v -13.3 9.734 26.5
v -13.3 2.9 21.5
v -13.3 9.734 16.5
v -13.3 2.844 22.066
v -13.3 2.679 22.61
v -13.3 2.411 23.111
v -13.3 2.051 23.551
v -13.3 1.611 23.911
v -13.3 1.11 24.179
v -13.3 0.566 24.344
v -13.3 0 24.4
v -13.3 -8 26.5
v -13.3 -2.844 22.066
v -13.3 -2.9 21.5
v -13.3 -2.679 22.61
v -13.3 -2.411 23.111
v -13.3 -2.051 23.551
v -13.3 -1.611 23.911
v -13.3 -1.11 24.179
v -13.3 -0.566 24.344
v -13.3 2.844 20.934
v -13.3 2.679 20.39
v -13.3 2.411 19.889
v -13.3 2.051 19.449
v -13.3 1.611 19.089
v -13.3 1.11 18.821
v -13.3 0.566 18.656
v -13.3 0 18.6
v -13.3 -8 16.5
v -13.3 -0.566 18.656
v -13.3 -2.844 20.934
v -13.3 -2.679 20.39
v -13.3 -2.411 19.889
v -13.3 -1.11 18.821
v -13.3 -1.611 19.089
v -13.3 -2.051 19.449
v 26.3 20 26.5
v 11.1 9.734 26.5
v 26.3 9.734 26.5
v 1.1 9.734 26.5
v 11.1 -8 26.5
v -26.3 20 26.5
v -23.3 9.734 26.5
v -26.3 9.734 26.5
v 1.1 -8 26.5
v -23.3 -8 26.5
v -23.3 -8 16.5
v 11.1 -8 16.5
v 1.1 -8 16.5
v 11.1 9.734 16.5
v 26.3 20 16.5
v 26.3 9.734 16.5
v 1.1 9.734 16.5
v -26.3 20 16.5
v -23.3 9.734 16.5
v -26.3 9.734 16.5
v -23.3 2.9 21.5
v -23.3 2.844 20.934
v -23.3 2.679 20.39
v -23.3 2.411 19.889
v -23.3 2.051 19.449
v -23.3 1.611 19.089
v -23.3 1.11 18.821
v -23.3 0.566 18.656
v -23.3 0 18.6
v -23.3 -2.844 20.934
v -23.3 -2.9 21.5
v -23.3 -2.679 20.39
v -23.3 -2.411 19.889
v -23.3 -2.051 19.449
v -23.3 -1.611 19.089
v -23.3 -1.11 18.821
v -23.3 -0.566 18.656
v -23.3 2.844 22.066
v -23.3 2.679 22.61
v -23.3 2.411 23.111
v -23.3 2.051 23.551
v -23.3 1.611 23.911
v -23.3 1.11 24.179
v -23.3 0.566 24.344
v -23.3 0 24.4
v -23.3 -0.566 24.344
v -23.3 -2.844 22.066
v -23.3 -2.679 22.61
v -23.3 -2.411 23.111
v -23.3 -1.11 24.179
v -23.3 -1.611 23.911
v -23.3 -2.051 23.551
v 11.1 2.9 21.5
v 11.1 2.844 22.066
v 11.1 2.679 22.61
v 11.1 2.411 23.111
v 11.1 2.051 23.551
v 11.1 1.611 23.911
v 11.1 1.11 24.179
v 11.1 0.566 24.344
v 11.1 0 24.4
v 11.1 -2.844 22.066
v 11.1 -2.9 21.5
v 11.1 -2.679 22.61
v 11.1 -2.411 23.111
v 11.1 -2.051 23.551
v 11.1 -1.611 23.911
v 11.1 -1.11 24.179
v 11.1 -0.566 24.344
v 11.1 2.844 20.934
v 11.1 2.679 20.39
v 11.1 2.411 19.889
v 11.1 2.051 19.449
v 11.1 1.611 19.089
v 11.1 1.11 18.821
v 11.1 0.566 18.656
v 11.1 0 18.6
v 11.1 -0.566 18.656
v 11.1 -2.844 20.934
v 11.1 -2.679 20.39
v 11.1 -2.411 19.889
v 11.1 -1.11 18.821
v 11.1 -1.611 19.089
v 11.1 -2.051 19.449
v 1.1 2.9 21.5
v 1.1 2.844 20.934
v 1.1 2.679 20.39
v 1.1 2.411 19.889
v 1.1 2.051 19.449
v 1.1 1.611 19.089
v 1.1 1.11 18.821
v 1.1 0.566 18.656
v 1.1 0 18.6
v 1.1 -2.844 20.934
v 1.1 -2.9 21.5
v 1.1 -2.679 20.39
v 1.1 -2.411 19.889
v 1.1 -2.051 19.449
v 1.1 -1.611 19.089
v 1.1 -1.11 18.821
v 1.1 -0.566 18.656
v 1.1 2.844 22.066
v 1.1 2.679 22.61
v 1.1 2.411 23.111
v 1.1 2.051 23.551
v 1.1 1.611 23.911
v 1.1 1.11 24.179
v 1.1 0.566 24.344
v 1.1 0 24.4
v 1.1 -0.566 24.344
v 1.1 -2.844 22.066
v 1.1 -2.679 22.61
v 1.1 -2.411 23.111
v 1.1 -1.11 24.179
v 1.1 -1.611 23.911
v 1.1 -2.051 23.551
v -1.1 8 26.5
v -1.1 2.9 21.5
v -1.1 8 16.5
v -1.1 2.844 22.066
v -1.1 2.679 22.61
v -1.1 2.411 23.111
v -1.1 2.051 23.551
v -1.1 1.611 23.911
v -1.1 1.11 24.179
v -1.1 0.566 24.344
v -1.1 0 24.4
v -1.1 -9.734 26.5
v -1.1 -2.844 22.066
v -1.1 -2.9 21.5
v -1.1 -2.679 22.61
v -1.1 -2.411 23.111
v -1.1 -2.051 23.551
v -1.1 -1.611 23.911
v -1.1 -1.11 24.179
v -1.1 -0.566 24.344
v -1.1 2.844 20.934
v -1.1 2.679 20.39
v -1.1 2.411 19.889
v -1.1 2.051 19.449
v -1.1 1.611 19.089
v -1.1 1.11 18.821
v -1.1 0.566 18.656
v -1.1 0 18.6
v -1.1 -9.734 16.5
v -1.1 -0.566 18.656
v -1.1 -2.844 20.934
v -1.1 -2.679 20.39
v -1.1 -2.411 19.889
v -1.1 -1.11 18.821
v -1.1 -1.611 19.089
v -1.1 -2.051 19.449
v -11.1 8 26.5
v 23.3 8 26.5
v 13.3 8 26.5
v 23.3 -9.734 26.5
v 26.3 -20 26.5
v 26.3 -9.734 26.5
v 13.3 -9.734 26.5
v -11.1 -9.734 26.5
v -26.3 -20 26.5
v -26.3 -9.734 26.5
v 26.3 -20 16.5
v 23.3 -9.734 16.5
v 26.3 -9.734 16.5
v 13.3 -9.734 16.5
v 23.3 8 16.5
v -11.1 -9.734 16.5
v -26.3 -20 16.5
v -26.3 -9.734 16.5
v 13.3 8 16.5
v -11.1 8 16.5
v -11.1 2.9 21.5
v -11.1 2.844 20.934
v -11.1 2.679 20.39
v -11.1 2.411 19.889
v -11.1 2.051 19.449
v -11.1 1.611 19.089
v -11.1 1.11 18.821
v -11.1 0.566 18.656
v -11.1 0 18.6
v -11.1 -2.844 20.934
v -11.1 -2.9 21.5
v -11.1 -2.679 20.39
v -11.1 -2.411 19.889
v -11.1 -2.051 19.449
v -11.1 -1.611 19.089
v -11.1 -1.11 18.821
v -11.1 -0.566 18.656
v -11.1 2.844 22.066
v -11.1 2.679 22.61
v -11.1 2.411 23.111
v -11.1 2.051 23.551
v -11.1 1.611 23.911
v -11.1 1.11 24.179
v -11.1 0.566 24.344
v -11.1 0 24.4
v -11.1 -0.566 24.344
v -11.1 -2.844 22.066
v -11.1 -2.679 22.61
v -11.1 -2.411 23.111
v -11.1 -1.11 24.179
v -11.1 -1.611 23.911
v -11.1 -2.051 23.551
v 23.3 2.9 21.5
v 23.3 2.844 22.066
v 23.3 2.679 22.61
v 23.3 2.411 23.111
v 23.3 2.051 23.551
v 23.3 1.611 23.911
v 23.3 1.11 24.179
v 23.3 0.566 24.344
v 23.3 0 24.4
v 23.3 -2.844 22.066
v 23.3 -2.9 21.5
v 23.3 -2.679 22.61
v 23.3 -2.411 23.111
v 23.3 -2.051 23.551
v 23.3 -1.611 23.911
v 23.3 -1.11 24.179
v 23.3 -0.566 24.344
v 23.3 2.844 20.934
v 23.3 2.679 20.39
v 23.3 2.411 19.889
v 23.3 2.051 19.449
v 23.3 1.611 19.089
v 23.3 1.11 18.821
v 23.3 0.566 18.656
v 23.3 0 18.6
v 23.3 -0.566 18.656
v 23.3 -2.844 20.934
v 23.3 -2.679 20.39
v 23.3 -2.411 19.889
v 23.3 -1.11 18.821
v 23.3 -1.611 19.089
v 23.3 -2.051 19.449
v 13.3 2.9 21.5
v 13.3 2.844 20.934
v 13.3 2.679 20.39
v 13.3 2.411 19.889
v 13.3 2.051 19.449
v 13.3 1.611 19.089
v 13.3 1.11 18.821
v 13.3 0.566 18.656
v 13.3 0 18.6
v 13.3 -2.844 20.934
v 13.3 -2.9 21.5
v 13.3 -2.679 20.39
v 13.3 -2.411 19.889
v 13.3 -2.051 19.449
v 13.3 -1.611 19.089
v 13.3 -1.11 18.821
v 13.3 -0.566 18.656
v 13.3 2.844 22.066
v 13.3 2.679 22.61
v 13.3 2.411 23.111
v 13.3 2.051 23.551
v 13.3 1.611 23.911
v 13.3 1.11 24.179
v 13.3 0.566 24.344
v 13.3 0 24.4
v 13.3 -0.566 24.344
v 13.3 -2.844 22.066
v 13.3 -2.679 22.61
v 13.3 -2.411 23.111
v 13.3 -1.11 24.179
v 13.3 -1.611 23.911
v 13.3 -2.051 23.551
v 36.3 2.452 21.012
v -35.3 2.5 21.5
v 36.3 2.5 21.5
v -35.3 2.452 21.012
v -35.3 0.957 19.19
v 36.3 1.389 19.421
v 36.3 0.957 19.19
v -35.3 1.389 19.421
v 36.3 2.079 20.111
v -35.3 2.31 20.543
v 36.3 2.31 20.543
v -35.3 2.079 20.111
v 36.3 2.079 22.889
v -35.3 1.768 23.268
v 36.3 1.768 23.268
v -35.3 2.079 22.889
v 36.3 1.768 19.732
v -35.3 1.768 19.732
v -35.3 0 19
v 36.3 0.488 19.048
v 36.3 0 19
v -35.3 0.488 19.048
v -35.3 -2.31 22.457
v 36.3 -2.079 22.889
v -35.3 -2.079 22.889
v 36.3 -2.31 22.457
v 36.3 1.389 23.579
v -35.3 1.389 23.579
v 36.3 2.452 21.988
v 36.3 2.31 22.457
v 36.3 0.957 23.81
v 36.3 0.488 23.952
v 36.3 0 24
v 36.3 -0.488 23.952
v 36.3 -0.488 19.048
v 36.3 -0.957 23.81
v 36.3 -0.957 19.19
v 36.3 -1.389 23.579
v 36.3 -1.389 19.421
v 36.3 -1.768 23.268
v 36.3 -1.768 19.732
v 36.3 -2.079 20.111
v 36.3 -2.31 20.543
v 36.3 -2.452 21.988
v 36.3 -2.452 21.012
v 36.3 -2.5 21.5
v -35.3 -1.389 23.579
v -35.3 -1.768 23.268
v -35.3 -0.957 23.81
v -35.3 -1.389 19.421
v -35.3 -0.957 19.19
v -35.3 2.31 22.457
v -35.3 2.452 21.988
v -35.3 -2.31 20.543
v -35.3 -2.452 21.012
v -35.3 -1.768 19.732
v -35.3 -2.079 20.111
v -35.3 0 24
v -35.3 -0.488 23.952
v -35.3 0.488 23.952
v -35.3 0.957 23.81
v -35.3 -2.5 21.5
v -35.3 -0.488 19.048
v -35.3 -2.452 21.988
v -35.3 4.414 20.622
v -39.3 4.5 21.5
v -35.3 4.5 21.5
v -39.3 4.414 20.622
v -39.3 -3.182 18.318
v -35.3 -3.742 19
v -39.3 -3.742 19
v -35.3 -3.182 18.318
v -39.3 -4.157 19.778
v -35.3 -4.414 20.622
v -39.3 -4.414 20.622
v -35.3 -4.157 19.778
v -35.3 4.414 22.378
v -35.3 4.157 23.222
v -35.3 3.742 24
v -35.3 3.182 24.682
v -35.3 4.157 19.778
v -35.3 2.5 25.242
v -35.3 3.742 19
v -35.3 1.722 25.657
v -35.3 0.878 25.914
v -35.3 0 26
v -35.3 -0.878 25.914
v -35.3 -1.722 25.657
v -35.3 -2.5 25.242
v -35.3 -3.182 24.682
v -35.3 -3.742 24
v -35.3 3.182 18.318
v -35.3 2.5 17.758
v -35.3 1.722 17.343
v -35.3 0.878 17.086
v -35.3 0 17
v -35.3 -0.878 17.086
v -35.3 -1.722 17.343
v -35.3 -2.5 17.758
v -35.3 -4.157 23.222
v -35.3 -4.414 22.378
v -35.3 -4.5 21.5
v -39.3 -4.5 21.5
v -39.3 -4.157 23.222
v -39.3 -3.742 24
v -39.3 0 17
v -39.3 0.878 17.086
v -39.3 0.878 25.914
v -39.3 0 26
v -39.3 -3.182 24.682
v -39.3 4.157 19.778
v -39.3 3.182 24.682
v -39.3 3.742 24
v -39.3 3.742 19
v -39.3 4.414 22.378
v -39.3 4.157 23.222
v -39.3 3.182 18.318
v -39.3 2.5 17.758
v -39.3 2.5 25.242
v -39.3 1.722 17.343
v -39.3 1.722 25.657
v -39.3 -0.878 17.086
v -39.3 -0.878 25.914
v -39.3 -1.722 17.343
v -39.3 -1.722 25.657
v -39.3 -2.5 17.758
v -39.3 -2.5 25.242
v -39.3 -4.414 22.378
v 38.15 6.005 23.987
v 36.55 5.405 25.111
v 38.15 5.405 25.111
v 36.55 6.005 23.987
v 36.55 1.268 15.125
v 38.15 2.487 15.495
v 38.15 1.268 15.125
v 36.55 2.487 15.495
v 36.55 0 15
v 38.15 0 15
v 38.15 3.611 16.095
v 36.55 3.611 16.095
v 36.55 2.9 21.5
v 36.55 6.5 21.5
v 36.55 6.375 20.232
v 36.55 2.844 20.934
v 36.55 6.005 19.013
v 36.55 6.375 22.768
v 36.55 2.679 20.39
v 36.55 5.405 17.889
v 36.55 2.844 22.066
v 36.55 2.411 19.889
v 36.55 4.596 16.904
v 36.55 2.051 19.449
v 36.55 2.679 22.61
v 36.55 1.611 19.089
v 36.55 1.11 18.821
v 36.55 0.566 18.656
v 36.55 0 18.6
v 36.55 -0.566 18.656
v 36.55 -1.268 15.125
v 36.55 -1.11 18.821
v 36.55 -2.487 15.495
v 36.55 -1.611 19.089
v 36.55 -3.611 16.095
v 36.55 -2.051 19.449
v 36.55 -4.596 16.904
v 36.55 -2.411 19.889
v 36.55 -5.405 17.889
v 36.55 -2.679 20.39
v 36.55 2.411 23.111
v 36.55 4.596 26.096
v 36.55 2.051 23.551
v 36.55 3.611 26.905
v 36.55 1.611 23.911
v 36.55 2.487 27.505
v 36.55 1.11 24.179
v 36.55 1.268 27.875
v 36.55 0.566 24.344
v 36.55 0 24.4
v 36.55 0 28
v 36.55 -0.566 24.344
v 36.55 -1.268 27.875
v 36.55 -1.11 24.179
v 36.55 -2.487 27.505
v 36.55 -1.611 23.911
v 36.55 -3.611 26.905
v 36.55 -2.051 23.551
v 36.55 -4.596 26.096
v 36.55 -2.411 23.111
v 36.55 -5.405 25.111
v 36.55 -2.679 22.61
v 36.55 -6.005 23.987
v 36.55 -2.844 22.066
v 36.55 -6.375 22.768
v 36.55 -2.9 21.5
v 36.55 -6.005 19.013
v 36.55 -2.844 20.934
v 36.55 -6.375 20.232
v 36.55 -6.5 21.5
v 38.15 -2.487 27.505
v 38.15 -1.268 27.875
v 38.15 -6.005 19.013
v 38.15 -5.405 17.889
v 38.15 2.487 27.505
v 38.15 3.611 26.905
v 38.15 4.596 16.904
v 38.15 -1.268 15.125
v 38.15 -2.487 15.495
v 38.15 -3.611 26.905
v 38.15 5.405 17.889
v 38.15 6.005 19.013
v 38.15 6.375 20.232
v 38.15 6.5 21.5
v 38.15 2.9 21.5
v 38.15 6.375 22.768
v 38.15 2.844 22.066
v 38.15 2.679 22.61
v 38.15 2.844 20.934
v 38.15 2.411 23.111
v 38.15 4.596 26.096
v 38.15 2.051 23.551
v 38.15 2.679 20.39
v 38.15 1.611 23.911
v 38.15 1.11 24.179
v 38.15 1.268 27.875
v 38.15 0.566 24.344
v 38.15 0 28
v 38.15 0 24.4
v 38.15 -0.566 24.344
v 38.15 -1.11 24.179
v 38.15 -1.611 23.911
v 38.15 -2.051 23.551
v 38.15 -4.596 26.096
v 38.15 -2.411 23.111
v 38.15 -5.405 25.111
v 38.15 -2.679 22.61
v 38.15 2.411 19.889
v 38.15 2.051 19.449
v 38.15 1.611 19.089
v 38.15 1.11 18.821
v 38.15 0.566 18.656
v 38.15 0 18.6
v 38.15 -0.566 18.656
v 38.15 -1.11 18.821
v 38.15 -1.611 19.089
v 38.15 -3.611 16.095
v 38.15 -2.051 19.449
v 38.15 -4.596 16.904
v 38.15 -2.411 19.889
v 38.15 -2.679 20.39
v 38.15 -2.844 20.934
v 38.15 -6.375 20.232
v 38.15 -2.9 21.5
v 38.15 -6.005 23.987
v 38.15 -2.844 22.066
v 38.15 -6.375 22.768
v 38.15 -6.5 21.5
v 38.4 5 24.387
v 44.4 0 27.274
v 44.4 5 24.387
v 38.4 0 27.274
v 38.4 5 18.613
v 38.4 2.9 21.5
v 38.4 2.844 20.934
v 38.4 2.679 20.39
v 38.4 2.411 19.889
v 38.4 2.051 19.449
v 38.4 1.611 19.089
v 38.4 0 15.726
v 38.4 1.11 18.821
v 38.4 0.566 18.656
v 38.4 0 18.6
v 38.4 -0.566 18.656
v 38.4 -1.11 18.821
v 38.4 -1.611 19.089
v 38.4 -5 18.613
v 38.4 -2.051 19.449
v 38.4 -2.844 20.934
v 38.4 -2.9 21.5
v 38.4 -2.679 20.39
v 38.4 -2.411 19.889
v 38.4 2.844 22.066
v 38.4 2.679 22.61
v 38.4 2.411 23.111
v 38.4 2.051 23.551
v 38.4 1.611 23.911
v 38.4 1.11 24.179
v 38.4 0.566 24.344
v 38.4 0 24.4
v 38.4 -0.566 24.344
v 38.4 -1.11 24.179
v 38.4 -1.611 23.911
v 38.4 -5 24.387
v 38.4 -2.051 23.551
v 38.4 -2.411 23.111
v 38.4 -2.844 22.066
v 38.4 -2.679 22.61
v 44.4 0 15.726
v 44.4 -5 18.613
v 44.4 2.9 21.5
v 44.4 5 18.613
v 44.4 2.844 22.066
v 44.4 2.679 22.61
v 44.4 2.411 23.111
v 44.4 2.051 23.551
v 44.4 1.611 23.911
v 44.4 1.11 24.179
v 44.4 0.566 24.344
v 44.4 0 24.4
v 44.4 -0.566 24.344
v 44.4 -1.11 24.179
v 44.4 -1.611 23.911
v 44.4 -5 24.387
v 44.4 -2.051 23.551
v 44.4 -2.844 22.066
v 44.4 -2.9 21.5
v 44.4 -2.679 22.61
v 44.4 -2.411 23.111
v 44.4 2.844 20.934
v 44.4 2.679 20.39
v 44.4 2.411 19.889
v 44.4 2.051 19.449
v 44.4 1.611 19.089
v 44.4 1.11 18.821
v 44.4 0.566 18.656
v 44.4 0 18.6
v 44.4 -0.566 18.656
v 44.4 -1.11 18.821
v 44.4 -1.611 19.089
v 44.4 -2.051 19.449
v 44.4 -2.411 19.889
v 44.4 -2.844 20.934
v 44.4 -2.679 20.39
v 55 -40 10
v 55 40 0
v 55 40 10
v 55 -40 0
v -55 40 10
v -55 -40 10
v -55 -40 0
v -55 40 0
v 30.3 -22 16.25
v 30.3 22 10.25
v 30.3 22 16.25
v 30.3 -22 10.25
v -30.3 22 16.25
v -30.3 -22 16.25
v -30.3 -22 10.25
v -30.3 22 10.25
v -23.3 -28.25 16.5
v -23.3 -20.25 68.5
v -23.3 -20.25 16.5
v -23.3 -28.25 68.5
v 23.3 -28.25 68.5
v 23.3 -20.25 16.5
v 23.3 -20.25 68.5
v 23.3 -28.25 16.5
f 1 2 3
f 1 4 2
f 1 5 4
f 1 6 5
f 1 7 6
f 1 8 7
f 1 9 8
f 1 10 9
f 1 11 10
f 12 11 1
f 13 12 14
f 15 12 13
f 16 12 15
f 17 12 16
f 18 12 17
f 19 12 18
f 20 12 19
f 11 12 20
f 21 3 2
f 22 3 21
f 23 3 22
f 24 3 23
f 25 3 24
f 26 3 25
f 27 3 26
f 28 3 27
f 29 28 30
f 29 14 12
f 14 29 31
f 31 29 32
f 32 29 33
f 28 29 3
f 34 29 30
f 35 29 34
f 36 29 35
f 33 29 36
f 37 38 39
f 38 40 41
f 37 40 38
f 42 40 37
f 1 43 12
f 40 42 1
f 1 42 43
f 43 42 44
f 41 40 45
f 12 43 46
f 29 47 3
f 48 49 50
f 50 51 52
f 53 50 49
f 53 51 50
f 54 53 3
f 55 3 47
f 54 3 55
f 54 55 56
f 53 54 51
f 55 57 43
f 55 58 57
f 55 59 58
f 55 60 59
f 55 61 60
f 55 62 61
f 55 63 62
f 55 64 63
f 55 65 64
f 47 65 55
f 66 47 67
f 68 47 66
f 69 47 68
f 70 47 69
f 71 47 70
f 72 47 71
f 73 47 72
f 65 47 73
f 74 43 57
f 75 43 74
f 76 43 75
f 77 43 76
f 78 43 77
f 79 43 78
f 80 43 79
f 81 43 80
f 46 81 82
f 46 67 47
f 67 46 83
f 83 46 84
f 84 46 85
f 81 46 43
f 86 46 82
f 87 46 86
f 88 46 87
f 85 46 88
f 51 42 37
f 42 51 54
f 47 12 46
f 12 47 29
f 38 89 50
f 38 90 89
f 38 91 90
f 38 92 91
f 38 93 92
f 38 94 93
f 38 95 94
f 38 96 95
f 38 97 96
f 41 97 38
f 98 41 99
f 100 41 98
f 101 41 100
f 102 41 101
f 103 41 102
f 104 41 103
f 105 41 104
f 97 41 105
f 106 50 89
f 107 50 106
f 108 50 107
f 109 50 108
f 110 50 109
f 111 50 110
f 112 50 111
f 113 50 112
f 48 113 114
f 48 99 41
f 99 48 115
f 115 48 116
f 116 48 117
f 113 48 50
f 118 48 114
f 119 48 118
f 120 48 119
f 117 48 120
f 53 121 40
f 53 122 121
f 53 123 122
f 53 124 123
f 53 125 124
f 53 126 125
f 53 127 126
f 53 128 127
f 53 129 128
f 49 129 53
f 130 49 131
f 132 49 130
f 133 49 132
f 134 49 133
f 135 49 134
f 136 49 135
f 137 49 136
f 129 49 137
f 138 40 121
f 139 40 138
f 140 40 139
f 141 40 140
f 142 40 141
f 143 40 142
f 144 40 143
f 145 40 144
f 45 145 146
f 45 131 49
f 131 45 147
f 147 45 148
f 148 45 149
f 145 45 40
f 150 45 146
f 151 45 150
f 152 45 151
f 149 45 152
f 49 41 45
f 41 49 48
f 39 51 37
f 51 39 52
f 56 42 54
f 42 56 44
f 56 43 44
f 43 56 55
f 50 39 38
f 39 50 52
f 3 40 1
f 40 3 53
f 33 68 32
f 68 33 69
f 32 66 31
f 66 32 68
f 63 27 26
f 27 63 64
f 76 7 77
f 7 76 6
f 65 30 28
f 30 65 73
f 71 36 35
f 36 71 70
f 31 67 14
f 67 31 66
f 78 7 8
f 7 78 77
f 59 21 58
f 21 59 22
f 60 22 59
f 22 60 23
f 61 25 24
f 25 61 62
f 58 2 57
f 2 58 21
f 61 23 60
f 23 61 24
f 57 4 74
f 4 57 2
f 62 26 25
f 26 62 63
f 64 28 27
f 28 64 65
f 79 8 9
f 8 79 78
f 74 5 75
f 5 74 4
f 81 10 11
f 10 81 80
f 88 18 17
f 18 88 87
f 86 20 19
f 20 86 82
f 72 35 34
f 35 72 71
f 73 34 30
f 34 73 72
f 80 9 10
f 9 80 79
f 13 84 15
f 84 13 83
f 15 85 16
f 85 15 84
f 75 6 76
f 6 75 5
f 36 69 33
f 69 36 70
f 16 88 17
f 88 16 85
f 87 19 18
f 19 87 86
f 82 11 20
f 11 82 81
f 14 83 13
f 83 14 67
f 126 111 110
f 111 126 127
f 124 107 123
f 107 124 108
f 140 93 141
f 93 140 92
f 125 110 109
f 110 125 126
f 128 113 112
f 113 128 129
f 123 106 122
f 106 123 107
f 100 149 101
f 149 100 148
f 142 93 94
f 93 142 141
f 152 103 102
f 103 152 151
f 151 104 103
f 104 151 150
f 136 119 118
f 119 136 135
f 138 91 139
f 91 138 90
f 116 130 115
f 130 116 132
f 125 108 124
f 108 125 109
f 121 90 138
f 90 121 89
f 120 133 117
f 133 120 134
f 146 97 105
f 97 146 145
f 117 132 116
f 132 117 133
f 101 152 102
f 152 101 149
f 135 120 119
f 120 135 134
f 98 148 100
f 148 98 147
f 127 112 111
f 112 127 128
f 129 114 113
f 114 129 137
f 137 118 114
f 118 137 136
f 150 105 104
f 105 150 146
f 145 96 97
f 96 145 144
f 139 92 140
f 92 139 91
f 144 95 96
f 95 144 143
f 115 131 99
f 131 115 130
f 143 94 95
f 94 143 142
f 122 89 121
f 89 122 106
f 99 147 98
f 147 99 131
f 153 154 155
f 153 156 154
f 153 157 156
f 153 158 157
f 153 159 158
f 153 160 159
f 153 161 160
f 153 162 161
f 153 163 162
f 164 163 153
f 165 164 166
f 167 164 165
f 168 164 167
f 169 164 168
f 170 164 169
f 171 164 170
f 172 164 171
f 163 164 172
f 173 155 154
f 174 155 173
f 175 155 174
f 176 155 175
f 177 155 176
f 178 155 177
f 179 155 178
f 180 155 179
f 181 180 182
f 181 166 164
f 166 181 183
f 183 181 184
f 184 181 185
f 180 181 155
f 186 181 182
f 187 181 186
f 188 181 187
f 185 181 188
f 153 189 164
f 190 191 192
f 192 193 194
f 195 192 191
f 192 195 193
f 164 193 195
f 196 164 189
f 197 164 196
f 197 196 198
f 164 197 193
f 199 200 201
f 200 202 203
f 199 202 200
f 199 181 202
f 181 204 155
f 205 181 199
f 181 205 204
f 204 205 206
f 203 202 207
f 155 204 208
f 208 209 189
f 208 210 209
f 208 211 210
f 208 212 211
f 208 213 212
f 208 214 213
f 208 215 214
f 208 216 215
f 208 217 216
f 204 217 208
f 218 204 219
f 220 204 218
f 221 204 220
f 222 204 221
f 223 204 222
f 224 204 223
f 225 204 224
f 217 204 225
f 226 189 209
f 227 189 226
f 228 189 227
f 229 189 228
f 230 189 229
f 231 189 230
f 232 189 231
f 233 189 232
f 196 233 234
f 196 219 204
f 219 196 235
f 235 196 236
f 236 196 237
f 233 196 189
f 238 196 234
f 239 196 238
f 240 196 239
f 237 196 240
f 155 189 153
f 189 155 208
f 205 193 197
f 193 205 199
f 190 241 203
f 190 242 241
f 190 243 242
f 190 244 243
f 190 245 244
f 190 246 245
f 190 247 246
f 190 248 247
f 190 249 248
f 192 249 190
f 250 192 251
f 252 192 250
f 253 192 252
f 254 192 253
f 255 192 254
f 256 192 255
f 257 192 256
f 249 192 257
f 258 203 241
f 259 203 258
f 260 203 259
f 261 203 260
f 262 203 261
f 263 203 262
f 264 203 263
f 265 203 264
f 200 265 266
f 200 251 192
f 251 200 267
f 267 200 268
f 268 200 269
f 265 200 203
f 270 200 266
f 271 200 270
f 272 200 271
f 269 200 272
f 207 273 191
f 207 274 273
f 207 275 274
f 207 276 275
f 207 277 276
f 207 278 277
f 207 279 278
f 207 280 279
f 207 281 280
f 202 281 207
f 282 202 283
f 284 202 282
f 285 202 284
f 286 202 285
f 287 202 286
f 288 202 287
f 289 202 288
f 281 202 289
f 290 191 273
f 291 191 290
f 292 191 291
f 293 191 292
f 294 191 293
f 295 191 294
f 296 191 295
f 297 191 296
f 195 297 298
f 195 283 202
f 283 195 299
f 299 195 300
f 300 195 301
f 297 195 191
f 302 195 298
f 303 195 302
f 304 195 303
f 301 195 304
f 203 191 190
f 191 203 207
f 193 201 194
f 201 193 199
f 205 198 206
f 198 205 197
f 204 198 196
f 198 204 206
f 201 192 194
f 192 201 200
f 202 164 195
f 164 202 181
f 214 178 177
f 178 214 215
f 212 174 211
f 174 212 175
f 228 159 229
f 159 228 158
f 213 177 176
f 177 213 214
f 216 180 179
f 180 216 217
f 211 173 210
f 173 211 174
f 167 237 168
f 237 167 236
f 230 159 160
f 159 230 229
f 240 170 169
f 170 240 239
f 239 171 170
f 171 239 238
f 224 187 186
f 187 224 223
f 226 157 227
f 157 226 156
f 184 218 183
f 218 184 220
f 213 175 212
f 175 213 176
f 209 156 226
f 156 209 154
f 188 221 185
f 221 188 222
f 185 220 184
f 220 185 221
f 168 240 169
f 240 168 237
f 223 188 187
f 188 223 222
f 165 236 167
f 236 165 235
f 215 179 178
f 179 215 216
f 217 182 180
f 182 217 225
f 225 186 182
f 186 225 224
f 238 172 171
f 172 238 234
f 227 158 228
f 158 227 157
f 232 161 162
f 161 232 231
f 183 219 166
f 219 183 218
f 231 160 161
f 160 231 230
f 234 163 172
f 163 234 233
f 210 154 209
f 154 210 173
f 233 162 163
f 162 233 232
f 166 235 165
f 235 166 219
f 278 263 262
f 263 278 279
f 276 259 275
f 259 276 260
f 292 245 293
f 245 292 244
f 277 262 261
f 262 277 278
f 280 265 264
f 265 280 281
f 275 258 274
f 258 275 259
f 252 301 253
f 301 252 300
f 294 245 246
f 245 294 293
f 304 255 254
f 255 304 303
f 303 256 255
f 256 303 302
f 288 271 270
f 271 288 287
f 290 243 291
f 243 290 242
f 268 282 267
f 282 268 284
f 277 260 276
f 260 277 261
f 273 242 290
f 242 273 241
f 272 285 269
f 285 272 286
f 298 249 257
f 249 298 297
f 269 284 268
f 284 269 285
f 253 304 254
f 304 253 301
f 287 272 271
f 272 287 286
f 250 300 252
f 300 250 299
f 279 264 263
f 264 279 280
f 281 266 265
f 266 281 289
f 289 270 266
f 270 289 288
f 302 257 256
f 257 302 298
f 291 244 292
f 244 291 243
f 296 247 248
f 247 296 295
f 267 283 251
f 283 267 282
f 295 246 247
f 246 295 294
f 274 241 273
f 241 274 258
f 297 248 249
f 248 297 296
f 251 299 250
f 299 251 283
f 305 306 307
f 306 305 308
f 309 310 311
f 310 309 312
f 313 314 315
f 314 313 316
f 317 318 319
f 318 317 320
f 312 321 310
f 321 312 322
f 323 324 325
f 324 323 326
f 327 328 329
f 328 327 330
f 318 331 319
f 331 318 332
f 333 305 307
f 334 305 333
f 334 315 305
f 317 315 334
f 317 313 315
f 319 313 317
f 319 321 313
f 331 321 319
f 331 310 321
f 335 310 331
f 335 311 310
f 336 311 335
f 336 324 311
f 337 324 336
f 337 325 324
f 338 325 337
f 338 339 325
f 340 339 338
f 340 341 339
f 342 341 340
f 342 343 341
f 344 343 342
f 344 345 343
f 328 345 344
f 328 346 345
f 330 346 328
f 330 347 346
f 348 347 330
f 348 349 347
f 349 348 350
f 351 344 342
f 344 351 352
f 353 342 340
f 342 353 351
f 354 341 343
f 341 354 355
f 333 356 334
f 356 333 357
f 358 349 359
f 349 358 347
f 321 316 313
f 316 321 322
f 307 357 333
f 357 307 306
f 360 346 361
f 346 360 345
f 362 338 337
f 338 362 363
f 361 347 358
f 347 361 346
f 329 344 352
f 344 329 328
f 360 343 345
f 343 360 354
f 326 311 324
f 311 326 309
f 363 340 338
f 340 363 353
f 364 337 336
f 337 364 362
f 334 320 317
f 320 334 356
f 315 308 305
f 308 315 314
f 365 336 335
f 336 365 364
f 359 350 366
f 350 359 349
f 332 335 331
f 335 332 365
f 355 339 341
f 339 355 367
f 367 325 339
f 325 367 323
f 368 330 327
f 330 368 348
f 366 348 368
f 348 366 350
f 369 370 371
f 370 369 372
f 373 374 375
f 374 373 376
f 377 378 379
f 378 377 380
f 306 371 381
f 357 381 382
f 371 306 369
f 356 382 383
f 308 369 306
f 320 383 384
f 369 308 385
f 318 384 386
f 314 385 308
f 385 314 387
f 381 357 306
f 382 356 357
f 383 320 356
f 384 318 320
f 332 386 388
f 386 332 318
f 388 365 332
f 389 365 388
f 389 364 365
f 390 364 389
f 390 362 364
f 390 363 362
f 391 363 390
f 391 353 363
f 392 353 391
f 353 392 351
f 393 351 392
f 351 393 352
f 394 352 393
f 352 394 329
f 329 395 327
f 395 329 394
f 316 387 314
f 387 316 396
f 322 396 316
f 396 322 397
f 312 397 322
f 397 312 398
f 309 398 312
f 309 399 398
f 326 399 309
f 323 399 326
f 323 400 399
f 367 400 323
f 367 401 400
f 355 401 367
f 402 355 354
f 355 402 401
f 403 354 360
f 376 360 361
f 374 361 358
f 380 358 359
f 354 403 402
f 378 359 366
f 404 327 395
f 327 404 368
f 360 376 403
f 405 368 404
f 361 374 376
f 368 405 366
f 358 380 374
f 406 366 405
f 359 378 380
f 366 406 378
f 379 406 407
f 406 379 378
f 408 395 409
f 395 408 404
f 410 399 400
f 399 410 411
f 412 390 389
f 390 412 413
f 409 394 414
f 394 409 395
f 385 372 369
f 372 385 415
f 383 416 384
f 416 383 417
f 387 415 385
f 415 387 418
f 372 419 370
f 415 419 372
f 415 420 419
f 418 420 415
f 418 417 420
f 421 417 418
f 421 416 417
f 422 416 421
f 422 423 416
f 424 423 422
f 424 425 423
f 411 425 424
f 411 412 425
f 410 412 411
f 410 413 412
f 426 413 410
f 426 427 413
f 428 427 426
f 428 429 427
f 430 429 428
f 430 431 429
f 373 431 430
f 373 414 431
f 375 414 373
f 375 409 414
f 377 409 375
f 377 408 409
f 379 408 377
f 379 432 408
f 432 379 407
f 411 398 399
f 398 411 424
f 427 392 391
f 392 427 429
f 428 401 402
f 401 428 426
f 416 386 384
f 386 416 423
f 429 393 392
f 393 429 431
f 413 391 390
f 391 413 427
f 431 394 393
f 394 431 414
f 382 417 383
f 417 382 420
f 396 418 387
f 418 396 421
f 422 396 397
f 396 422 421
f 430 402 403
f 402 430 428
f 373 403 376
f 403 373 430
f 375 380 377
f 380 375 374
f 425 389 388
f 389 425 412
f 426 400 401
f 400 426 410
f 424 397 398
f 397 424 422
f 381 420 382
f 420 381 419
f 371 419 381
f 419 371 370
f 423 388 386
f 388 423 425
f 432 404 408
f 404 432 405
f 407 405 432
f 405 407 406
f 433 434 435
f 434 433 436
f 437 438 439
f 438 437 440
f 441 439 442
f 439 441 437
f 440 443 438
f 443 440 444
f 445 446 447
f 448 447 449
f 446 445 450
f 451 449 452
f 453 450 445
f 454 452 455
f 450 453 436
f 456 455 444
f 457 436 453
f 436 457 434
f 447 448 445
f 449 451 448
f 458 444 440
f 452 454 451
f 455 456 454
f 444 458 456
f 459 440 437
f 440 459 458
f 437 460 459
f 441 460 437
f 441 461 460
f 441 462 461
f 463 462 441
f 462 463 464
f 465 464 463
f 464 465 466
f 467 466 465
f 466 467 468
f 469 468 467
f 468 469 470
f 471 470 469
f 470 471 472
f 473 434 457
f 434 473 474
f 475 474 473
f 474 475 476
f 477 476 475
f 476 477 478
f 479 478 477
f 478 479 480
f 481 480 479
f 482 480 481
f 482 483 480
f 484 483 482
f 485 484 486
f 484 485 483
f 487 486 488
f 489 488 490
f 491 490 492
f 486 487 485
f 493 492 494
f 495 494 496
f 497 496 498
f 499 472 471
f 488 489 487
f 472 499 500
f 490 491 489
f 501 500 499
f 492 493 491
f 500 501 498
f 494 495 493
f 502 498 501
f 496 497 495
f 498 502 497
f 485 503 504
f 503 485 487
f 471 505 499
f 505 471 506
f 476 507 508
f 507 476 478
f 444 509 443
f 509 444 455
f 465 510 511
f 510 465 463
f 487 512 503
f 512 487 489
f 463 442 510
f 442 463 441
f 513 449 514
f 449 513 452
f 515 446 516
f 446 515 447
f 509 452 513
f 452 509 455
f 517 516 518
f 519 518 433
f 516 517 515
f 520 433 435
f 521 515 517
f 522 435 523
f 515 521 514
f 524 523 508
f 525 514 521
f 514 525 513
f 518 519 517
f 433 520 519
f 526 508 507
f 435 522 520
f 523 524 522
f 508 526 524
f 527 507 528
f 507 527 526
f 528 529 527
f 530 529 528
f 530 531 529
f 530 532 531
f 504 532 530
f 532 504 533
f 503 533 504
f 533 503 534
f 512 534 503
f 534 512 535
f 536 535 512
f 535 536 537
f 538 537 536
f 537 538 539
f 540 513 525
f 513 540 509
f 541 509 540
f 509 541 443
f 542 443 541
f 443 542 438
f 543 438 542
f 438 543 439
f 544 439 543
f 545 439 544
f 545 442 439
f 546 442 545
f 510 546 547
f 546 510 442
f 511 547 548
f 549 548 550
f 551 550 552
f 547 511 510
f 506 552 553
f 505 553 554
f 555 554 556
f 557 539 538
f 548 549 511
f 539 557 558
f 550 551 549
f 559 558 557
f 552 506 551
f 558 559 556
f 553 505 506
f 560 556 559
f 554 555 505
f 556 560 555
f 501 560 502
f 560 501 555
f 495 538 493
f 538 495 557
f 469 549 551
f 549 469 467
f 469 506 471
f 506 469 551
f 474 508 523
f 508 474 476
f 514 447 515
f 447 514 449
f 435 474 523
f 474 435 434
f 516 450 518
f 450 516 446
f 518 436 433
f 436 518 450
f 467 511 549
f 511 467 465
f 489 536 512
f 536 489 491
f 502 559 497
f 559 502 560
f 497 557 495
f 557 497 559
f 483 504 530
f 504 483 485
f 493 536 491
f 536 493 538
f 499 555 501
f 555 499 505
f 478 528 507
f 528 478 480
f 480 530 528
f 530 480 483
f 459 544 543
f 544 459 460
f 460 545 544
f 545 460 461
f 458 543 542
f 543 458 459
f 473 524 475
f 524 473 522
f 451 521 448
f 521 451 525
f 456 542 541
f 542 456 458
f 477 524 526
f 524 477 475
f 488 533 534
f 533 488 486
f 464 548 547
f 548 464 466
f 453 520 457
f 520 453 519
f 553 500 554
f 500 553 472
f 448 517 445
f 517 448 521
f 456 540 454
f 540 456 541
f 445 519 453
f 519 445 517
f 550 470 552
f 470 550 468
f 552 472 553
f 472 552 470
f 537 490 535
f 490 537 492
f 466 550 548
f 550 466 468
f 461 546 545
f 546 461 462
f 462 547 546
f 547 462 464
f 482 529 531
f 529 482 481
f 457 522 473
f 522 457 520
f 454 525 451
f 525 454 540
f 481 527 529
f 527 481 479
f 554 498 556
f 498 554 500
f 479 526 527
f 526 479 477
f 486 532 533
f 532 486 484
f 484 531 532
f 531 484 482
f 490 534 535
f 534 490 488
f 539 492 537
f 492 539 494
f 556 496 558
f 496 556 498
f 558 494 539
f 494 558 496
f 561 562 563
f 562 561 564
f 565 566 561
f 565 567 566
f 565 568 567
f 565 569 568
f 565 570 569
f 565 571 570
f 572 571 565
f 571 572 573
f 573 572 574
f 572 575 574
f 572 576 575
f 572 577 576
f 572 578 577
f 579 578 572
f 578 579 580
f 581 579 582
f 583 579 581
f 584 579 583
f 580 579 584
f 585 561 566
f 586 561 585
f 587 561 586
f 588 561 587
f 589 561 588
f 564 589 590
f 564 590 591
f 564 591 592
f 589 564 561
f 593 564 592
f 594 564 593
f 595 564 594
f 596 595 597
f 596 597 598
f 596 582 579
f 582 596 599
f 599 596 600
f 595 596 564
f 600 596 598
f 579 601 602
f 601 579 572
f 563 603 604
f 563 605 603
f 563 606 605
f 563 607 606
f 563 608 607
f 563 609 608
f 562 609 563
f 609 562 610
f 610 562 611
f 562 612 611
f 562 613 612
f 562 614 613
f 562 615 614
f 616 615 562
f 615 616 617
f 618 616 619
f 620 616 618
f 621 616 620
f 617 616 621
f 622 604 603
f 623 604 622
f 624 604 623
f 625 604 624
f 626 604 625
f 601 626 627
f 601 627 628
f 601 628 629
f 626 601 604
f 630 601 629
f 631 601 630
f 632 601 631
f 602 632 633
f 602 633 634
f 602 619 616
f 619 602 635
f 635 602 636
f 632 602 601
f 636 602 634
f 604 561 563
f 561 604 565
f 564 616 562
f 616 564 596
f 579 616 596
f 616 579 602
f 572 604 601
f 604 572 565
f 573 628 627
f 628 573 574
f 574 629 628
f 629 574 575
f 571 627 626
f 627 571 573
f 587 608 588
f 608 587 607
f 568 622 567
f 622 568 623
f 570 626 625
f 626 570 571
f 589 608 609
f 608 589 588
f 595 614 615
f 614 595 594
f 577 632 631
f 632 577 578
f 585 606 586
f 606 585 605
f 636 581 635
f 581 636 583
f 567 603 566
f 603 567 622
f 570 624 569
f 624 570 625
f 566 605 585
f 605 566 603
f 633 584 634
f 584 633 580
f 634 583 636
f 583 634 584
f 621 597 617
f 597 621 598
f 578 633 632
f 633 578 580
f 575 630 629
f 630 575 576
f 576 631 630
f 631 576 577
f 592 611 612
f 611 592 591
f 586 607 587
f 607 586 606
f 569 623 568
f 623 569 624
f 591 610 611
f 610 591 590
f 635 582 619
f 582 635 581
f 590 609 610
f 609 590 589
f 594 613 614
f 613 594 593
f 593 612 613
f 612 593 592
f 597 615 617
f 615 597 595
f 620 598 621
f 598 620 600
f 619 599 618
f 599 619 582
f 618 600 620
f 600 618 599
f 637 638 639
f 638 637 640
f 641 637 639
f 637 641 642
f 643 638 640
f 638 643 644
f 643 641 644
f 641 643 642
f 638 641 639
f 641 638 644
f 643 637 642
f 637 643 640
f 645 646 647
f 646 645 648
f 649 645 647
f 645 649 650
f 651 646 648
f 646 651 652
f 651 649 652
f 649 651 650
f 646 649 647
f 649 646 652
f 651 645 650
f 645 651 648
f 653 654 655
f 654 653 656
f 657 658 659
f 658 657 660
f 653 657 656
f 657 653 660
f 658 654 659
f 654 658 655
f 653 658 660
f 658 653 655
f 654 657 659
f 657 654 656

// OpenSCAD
$fn = 32;

// ------------------------------------------------------------------------
// Comb hinge with flap: leaf 52.6 x 20 mm, pin d5, flap 52 mm
// Every part is its own module, assembly() places every instance.
// ------------------------------------------------------------------------

// --- part 1 ---
module hinge_bed() {
  difference() {
    translate([-55, -40, 0]) cube([110, 80, 10]);
  }
}

// --- part 2 ---
module hinge_riser() {
  difference() {
    translate([-30.3, -22, 0]) cube([60.6, 44, 6]);
  }
}

// --- part 3 ---
module hinge_leaf_a() {
  difference() {
    union() {
      translate([-23.3, -8, -5]) cube([10, 28, 10]);
      translate([1.1, -8, -5]) cube([10, 28, 10]);
      translate([-26.3, 9.734, -5]) cube([52.6, 10.266, 10]);
    }
    translate([-18.3, 0, 0]) rotate([0, 90, 0]) cylinder(h = 12, d = 5.8, center = true);
    translate([6.1, 0, 0]) rotate([0, 90, 0]) cylinder(h = 12, d = 5.8, center = true);
  }
}

// --- part 4 ---
module hinge_leaf_b() {
  difference() {
    union() {
      translate([-11.1, -20, -5]) cube([10, 28, 10]);
      translate([13.3, -20, -5]) cube([10, 28, 10]);
      translate([-26.3, -20, -5]) cube([52.6, 10.266, 10]);
    }
    translate([-6.1, 0, 0]) rotate([0, 90, 0]) cylinder(h = 12, d = 5.8, center = true);
    translate([18.3, 0, 0]) rotate([0, 90, 0]) cylinder(h = 12, d = 5.8, center = true);
  }
}

// --- part 5 ---
module hinge_flap() {
  difference() {
    translate([-23.3, -26, 0]) cube([46.6, 52, 8]);
  }
}

// --- part 6 ---
module hinge_pin() {
  rotate([0, 90, 0]) cylinder(h = 72.6, d = 5, center = true);
  translate([-39.3, 0, 0]) rotate([0, 90, 0]) cylinder(h = 4, d = 9);
}

// --- part 7 ---
module pin_washer() {
  difference() {
      translate([0, 0, 0]) cylinder(h = 1.6, d = 13);
      translate([0, 0, -1]) cylinder(h = 3.6, d = 5.8);
    }
}

// --- part 8 ---
module pin_nut() {
  difference() {
    linear_extrude(height = 6) polygon(points = [[5.774, 0], [2.887, 5], [-2.887, 5], [-5.774, 0], [-2.887, -5], [2.887, -5]]);
    translate([0, 0, -1]) cylinder(h = 8, d = 5.8);
  }
}

// --- assembly ---
module assembly() {
  color([0.80, 0.24, 0.20]) translate([0, 0, 0]) rotate([0, 0, 0]) hinge_bed();
  color([0.20, 0.45, 0.75]) translate([0, 0, 10.25]) rotate([0, 0, 0]) hinge_riser();
  color([0.25, 0.62, 0.32]) translate([0, 0, 21.5]) rotate([0, 0, 0]) hinge_leaf_a();
  color([0.92, 0.70, 0.18]) translate([0, 0, 21.5]) rotate([0, 0, 0]) hinge_leaf_b();
  color([0.58, 0.35, 0.70]) translate([0, -20.25, 42.5]) rotate([90, 0, 0]) hinge_flap();
  color([0.16, 0.66, 0.66]) translate([0, 0, 21.5]) rotate([0, 0, 0]) hinge_pin();
  color([0.85, 0.48, 0.18]) translate([36.55, 0, 21.5]) rotate([0, 90, 0]) pin_washer();
  color([0.55, 0.60, 0.65]) translate([38.4, 0, 21.5]) rotate([0, 90, 0]) pin_nut();
}

assembly();
